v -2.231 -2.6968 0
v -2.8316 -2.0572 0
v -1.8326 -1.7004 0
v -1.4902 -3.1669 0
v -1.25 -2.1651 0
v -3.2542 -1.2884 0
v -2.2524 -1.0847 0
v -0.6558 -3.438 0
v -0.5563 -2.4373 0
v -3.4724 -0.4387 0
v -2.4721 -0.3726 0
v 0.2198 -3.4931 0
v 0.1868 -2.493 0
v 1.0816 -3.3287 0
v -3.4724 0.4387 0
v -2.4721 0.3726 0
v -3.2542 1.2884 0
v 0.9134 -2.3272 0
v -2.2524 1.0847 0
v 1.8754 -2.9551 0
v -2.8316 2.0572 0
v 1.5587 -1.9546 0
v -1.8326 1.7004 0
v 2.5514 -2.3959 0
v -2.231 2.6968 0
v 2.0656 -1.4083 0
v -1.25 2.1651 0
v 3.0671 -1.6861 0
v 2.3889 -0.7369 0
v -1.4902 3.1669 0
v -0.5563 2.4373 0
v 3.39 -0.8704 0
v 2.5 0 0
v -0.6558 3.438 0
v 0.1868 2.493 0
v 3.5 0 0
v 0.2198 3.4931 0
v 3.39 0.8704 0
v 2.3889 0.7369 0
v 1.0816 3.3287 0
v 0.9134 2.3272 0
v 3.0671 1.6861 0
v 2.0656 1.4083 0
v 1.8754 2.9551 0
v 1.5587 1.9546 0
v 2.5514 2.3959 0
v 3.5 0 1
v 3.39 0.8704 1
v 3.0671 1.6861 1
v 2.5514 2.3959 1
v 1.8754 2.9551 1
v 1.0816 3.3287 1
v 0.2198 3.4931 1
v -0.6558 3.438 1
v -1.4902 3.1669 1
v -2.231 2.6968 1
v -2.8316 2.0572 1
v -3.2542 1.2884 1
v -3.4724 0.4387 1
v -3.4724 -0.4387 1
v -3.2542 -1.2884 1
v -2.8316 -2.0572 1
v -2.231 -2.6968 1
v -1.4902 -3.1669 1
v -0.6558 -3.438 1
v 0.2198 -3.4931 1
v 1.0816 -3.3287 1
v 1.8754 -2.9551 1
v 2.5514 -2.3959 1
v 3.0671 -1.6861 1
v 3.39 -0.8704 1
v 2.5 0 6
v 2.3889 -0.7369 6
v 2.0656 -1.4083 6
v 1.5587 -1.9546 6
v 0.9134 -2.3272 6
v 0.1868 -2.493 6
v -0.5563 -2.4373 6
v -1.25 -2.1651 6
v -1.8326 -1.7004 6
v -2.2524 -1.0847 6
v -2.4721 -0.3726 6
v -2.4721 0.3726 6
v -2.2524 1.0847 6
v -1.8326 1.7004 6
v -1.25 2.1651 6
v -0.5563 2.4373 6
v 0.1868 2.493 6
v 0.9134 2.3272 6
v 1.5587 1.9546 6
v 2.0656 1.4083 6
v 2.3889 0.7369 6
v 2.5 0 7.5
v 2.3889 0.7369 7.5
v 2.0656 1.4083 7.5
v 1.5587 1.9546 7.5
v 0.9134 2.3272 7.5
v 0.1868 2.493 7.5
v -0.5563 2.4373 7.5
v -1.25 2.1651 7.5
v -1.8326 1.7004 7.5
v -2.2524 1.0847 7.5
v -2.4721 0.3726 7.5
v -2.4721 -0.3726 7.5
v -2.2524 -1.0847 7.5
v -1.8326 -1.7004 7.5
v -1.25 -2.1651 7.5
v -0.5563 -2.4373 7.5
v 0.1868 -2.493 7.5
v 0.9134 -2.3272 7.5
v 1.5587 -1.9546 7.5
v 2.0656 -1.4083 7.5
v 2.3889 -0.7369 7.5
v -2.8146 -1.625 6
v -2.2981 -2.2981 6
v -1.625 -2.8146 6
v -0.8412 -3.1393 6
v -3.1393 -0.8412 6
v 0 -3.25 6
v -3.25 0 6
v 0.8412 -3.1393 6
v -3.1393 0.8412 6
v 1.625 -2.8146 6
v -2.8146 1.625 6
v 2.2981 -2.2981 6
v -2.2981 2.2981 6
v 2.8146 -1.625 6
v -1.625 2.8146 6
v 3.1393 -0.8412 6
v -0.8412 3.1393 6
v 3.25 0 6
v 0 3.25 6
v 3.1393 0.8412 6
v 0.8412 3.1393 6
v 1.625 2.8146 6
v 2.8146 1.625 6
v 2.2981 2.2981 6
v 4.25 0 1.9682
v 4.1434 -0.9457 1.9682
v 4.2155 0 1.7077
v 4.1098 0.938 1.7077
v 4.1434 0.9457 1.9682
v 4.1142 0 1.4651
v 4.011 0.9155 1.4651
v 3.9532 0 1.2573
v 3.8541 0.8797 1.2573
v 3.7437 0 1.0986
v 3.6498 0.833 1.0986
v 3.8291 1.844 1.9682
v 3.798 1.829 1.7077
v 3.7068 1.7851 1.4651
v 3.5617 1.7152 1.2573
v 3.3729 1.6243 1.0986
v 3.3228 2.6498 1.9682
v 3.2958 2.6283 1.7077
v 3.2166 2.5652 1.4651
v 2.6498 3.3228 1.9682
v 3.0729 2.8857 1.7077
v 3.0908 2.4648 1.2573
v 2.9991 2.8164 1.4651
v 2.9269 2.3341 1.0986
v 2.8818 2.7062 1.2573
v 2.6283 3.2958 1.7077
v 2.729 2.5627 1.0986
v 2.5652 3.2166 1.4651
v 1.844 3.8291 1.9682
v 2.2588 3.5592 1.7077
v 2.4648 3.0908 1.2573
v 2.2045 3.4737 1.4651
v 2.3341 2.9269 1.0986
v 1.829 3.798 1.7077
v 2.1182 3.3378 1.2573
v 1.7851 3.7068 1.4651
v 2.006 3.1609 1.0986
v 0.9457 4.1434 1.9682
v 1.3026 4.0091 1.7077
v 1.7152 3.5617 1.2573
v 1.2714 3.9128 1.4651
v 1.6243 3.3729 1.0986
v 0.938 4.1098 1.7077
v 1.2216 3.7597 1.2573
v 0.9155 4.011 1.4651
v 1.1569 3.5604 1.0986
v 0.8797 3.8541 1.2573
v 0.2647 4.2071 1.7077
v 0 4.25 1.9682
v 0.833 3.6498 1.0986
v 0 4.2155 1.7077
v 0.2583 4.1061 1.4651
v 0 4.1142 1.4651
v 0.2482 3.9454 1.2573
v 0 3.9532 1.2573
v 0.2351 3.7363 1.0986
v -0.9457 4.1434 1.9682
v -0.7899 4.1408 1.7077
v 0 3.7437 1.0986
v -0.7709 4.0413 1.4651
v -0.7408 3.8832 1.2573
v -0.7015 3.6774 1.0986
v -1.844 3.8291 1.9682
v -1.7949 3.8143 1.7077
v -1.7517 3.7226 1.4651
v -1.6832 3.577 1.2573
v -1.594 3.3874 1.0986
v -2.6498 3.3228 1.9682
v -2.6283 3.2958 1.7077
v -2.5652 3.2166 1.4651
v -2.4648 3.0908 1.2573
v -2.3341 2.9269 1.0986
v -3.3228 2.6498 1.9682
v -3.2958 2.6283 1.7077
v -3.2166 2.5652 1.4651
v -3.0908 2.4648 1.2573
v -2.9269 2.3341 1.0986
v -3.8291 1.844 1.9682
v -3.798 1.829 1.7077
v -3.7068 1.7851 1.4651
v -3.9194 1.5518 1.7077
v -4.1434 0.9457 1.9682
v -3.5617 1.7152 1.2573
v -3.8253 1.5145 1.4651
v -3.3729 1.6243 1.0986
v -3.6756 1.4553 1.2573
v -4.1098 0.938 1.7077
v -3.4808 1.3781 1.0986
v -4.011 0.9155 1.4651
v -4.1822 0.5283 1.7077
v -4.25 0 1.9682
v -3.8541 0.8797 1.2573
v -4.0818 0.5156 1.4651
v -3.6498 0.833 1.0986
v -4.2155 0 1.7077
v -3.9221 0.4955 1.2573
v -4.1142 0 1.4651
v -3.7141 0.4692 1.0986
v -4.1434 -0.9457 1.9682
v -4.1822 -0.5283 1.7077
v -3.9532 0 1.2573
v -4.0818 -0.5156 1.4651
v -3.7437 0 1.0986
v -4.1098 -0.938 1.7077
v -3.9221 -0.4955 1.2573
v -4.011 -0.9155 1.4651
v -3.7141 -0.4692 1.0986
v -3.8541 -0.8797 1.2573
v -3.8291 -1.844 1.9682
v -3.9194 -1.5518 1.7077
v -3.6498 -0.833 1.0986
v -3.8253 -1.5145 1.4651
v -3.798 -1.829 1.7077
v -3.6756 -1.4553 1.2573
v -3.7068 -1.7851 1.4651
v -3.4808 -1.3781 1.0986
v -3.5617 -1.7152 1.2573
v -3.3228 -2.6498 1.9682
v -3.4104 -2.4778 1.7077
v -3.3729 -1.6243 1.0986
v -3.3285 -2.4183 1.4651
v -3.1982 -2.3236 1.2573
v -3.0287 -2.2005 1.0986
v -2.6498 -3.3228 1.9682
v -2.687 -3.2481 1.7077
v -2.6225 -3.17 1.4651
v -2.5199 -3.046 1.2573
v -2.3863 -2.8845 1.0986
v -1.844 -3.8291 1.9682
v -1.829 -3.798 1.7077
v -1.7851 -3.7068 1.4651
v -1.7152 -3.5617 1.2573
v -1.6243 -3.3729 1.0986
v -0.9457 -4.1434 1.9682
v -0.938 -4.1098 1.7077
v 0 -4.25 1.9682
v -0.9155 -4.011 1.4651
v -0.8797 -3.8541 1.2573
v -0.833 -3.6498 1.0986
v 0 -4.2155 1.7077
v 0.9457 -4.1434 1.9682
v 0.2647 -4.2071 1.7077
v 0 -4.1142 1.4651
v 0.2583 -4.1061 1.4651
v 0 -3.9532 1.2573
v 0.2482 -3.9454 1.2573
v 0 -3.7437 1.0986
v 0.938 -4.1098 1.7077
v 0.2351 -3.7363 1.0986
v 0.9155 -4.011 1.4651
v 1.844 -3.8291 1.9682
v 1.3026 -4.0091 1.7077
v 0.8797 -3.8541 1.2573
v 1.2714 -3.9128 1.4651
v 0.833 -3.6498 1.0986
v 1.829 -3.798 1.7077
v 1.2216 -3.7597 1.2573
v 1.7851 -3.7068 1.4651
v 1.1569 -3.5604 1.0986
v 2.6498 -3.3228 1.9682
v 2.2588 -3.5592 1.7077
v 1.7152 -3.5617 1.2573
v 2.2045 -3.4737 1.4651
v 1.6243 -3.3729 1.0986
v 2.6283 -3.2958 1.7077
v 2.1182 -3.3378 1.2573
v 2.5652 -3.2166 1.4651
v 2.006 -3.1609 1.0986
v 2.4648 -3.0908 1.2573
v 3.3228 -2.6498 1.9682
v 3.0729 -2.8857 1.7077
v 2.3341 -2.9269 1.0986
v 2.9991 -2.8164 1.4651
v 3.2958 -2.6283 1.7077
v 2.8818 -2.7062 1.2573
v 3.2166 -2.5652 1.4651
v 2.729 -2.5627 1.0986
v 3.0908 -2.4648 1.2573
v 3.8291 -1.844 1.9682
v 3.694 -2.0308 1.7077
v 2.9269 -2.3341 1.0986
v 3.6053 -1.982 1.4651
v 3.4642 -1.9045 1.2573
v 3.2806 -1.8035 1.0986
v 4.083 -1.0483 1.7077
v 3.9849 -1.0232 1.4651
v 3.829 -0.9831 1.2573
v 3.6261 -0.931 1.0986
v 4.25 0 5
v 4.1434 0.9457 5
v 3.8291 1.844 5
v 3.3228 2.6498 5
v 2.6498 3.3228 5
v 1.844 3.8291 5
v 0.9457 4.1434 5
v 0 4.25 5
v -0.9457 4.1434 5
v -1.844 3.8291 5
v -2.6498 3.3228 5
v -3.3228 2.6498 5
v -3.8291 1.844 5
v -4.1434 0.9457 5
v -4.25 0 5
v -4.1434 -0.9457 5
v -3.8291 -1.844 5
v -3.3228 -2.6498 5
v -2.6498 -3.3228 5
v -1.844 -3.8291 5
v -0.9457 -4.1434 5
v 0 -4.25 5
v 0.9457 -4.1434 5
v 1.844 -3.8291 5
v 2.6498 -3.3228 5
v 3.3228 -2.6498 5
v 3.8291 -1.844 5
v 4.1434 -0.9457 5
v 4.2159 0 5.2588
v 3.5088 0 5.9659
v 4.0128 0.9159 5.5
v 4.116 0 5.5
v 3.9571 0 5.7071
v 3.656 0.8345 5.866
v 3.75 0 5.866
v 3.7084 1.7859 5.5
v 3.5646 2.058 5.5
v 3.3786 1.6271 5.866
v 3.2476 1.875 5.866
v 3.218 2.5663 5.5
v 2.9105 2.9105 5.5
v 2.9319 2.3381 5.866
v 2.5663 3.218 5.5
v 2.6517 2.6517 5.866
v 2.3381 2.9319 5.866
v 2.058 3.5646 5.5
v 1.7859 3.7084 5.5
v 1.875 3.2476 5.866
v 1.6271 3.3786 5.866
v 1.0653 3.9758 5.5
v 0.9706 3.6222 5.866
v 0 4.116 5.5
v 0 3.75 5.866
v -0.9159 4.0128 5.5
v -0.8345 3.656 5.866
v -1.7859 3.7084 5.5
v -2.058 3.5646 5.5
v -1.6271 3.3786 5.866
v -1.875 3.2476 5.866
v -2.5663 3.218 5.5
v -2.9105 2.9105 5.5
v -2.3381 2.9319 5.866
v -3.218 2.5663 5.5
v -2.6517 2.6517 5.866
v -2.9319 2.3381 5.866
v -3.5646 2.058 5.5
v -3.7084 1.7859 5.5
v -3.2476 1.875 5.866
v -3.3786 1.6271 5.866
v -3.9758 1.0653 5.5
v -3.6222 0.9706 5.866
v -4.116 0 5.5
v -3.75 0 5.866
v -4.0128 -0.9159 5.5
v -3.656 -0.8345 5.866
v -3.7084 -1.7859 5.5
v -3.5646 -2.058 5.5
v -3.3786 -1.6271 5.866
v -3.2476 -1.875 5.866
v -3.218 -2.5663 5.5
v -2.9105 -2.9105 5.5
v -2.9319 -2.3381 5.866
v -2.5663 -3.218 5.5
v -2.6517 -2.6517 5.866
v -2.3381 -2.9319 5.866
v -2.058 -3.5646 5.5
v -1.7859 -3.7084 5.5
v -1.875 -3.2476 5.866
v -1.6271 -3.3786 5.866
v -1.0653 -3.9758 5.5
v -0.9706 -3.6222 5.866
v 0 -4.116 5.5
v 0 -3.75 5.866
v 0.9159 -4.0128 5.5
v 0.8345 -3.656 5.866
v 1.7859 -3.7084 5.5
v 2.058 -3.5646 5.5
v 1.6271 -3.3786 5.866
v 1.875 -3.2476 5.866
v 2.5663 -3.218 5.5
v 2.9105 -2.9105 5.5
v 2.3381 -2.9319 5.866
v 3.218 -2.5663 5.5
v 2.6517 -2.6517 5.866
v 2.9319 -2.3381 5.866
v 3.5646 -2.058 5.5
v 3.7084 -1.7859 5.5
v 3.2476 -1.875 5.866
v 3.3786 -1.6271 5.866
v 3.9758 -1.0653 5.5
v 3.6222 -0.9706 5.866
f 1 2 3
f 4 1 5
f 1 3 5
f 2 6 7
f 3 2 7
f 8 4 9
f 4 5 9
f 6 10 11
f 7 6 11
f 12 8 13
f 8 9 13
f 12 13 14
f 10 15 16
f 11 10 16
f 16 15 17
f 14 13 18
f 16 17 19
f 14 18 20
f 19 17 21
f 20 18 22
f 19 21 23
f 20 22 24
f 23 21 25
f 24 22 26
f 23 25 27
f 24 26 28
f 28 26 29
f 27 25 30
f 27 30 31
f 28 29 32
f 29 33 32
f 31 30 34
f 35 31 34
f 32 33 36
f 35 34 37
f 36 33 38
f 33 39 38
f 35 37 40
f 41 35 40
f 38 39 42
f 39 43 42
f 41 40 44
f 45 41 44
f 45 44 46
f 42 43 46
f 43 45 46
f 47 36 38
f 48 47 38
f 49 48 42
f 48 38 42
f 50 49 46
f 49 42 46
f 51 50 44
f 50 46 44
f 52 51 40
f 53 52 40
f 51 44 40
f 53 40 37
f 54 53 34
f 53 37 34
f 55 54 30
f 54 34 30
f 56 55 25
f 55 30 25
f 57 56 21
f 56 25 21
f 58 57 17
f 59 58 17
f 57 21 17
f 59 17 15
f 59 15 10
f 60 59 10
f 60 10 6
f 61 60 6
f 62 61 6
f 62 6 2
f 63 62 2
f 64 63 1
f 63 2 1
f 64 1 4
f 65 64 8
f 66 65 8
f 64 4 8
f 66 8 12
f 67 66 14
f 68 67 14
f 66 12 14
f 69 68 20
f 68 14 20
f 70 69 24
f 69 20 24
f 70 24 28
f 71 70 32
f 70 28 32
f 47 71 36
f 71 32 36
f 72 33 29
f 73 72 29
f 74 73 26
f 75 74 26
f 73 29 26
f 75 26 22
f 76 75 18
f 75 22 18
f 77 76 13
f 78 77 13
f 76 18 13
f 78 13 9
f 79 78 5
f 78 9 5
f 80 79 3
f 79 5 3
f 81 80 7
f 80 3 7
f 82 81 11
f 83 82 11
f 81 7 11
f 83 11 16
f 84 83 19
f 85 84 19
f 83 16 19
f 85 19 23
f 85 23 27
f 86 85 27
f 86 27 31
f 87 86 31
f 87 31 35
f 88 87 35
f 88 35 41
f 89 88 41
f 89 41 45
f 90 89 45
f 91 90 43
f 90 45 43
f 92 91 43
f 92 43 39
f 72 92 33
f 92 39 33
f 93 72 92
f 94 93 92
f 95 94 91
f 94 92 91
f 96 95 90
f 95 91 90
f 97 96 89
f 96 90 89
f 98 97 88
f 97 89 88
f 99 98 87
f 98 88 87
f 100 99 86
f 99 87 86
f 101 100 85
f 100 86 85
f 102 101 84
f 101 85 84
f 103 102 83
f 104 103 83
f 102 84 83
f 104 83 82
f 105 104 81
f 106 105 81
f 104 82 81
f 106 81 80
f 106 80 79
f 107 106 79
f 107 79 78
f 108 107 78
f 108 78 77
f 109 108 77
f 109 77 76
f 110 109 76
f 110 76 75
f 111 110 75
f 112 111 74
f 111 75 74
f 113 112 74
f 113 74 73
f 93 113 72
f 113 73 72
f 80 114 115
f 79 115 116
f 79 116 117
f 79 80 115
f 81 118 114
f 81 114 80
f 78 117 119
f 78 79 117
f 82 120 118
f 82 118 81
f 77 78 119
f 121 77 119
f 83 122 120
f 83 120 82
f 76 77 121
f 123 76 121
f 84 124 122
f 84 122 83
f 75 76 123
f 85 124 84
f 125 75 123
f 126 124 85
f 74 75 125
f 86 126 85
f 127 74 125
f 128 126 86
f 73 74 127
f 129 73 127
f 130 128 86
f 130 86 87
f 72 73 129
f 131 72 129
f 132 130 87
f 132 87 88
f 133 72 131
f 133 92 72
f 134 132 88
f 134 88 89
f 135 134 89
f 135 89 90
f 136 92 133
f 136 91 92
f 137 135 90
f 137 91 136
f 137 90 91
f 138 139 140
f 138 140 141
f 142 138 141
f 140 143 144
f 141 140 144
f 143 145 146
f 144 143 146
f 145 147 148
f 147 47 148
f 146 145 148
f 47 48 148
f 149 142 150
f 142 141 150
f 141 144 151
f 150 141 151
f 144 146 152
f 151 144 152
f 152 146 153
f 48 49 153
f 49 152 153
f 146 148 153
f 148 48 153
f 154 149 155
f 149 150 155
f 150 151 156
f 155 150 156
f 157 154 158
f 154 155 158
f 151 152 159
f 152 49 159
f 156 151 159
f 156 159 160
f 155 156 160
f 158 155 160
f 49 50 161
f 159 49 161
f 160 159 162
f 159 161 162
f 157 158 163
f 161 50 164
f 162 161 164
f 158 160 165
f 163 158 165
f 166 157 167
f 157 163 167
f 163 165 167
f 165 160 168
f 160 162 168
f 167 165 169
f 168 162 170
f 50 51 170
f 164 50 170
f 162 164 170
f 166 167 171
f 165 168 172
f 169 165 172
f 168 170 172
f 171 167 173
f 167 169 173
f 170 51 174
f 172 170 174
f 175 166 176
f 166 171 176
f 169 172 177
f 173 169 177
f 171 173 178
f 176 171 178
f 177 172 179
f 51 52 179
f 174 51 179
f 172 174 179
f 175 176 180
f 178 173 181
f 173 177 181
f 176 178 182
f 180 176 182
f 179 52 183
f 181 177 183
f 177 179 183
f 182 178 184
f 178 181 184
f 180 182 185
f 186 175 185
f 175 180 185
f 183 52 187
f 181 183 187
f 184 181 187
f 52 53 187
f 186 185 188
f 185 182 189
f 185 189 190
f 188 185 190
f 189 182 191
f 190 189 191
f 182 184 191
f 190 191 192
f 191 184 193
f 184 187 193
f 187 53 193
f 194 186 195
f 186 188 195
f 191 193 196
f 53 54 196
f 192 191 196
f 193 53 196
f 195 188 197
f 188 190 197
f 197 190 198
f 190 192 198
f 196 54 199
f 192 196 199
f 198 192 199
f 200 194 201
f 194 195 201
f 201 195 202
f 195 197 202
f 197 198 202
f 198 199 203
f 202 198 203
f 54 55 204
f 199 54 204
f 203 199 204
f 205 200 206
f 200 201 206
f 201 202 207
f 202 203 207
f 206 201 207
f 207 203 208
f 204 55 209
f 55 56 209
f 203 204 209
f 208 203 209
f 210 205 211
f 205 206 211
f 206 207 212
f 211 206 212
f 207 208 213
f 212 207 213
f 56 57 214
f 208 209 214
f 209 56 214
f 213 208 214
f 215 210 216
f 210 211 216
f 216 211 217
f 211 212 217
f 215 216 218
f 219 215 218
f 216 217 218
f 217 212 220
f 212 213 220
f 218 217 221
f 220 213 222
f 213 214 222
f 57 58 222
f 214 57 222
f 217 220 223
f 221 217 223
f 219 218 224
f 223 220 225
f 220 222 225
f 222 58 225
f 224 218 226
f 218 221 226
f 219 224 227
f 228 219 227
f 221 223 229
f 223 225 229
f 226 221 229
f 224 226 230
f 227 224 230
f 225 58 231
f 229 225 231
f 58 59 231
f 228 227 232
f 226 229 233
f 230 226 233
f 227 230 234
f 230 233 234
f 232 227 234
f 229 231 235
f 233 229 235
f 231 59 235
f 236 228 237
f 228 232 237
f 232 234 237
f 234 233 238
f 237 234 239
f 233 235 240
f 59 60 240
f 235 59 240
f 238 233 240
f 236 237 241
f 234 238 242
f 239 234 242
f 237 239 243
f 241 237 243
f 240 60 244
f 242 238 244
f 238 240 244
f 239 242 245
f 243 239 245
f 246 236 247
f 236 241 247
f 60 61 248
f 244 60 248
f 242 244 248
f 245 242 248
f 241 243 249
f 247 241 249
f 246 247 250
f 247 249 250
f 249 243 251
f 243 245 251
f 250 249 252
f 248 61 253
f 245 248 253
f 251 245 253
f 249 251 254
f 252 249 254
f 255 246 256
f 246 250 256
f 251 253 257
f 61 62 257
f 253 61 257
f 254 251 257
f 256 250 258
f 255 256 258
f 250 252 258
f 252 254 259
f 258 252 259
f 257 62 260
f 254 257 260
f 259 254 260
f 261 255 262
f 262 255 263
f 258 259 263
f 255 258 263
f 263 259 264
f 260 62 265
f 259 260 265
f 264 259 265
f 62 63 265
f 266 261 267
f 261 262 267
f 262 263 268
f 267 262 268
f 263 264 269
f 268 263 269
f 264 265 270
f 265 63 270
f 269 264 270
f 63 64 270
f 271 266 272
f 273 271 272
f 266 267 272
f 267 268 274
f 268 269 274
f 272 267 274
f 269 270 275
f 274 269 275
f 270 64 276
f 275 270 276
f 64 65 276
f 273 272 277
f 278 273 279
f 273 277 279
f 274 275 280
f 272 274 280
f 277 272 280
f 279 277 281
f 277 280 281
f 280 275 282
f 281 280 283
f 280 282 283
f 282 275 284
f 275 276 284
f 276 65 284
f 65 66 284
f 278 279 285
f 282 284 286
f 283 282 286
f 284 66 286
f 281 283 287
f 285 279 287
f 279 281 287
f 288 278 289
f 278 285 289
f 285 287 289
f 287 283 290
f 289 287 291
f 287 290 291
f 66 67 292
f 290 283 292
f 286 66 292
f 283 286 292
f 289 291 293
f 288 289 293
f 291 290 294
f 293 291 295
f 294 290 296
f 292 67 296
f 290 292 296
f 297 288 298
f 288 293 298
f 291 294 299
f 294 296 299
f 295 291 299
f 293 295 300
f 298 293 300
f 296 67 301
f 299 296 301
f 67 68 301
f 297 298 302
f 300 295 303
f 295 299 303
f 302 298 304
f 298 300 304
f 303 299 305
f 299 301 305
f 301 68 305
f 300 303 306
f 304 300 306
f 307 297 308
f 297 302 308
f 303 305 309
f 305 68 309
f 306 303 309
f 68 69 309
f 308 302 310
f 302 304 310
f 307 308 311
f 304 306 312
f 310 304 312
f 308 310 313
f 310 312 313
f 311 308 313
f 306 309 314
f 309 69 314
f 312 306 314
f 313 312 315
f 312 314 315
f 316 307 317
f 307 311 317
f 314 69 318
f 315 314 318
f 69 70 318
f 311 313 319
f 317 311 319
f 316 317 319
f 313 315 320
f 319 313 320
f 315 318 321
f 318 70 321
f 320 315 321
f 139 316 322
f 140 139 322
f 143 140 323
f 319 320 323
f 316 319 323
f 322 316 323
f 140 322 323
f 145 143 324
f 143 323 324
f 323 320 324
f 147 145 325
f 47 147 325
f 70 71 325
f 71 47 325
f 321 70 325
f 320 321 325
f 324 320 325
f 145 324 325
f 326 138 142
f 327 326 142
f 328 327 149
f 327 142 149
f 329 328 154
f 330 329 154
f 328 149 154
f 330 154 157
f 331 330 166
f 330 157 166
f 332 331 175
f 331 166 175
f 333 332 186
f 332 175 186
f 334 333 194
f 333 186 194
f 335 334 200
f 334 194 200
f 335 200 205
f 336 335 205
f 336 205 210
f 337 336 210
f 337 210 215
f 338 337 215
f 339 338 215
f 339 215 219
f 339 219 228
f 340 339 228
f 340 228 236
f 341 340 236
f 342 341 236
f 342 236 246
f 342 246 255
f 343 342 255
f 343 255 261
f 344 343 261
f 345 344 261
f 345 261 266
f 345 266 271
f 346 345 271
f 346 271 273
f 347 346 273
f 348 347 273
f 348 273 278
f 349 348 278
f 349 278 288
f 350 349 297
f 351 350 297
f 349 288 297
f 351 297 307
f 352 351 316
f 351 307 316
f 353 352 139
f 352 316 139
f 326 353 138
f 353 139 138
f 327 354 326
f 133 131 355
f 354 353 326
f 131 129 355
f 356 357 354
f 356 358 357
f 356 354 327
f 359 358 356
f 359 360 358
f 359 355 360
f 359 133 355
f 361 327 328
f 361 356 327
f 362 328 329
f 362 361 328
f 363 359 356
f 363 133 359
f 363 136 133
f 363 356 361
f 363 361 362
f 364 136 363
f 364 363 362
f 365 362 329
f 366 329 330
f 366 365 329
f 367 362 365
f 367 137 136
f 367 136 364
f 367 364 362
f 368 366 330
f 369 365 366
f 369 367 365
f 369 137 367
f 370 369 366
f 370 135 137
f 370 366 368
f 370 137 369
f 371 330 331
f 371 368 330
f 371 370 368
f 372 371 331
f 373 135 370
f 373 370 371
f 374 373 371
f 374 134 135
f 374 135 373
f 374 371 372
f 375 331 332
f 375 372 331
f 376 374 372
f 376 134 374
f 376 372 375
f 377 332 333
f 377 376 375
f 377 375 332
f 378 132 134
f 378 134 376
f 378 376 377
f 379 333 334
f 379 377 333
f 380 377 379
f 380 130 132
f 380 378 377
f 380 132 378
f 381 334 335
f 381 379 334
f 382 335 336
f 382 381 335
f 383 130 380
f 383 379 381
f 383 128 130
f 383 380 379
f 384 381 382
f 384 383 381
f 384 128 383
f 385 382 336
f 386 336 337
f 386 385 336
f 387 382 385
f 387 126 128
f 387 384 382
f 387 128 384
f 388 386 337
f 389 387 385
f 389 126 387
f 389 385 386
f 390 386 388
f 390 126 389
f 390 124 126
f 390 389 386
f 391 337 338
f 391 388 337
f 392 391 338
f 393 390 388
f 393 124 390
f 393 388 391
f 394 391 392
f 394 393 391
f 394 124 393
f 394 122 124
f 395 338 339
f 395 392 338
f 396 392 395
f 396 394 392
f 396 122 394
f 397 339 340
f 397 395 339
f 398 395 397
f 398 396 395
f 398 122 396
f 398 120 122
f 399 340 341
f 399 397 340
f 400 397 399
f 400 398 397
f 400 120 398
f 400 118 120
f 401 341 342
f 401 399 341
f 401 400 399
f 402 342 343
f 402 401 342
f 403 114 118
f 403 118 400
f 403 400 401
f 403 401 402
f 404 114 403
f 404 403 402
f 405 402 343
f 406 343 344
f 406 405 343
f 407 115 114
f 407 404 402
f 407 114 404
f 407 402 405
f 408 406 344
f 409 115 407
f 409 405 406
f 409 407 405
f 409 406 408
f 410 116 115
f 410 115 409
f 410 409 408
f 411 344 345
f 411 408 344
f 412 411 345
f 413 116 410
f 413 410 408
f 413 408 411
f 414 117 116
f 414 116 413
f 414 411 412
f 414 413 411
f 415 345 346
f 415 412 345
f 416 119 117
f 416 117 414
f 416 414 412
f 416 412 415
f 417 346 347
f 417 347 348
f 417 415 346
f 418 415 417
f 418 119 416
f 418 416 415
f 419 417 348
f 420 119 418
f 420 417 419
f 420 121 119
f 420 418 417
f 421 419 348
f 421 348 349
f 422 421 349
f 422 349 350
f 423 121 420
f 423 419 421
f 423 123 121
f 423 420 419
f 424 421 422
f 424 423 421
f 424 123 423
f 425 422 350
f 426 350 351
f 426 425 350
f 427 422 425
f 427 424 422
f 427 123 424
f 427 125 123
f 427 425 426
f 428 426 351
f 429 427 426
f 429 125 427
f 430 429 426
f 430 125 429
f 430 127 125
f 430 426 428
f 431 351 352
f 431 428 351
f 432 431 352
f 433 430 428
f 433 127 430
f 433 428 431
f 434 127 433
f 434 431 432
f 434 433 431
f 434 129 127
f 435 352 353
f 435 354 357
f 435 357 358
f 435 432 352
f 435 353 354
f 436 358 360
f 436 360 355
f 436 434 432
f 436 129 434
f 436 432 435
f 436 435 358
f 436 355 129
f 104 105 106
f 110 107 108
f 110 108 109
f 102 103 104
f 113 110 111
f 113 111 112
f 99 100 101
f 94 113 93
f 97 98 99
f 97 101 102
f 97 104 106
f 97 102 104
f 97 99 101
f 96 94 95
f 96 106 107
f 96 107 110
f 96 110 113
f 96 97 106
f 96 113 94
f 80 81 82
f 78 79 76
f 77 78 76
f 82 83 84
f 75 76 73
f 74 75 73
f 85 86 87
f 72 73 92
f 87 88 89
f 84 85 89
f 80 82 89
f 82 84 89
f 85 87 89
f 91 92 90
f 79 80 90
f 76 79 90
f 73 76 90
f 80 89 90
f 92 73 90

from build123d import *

# Parameters (mm, degrees)
F0_R     = 3.5
F1_DEPTH = 1
F2_R     = 4.25
F3_DEPTH = 5
F4_R     = 2.5
F5_DEPTH = 1.5
F7_R     = 2.5
F8_DEPTH = 6


# Not quite as in the source:
# - a fillet or chamfer that OpenCascade refuses, or shapes differently, is made with other operations: its cross-section is extruded or revolved along the edge and cut away or added


with BuildPart() as f1:
    # F0 (on Top) → F1 (new body)
    with BuildSketch(Plane.XY):
        Circle(F0_R)
    extrude(amount=F1_DEPTH)

    # F2 (on face) → F3 (join)
    with BuildSketch(Plane.XY.offset(1)):
        Circle(F2_R)
    extrude(amount=F3_DEPTH)

    # F6: fillet of radius 1 on 2 edges, made by hand

    # F6_s1 → F6_t2 (revolve, cut)
    with BuildSketch(Plane.XZ):
        with BuildLine():
            ThreePointArc((4.25, 5), (3.9571067812, 5.7071067812), (3.25, 6))
            Line((3.25, 6), (4.25, 6))
            Line((4.25, 6), (4.25, 5))
        make_face()
    revolve(axis=Axis((0, 0, 6), (0, 0, 1)), mode=Mode.SUBTRACT)

    # F6_s3 → F6_t4 (revolve, cut)
    with BuildSketch(Plane.XZ):
        with BuildLine():
            ThreePointArc((4.25, 1.9682458366), (4.040569415, 1.3558734009), (3.5, 1))
            Line((3.5, 1), (4.25, 1))
            Line((4.25, 1), (4.25, 1.9682458366))
        make_face()
    revolve(axis=Axis((0, 0, 1), (0, 0, 1)), mode=Mode.SUBTRACT)

    # F7 (on face) → F8 (cut)
    with BuildSketch(Plane(origin=(0, 0, 0), x_dir=(1, 0, 0), z_dir=(0, 0, -1))):
        Circle(F7_R)
    extrude(amount=-F8_DEPTH, mode=Mode.SUBTRACT)


with BuildPart() as f5:
    # F4 (on face) → F5 (new body)
    with BuildSketch(Plane.XY.offset(6)):
        Circle(F4_R)
    extrude(amount=F5_DEPTH)


solid = Compound([f1.part, f5.part])
